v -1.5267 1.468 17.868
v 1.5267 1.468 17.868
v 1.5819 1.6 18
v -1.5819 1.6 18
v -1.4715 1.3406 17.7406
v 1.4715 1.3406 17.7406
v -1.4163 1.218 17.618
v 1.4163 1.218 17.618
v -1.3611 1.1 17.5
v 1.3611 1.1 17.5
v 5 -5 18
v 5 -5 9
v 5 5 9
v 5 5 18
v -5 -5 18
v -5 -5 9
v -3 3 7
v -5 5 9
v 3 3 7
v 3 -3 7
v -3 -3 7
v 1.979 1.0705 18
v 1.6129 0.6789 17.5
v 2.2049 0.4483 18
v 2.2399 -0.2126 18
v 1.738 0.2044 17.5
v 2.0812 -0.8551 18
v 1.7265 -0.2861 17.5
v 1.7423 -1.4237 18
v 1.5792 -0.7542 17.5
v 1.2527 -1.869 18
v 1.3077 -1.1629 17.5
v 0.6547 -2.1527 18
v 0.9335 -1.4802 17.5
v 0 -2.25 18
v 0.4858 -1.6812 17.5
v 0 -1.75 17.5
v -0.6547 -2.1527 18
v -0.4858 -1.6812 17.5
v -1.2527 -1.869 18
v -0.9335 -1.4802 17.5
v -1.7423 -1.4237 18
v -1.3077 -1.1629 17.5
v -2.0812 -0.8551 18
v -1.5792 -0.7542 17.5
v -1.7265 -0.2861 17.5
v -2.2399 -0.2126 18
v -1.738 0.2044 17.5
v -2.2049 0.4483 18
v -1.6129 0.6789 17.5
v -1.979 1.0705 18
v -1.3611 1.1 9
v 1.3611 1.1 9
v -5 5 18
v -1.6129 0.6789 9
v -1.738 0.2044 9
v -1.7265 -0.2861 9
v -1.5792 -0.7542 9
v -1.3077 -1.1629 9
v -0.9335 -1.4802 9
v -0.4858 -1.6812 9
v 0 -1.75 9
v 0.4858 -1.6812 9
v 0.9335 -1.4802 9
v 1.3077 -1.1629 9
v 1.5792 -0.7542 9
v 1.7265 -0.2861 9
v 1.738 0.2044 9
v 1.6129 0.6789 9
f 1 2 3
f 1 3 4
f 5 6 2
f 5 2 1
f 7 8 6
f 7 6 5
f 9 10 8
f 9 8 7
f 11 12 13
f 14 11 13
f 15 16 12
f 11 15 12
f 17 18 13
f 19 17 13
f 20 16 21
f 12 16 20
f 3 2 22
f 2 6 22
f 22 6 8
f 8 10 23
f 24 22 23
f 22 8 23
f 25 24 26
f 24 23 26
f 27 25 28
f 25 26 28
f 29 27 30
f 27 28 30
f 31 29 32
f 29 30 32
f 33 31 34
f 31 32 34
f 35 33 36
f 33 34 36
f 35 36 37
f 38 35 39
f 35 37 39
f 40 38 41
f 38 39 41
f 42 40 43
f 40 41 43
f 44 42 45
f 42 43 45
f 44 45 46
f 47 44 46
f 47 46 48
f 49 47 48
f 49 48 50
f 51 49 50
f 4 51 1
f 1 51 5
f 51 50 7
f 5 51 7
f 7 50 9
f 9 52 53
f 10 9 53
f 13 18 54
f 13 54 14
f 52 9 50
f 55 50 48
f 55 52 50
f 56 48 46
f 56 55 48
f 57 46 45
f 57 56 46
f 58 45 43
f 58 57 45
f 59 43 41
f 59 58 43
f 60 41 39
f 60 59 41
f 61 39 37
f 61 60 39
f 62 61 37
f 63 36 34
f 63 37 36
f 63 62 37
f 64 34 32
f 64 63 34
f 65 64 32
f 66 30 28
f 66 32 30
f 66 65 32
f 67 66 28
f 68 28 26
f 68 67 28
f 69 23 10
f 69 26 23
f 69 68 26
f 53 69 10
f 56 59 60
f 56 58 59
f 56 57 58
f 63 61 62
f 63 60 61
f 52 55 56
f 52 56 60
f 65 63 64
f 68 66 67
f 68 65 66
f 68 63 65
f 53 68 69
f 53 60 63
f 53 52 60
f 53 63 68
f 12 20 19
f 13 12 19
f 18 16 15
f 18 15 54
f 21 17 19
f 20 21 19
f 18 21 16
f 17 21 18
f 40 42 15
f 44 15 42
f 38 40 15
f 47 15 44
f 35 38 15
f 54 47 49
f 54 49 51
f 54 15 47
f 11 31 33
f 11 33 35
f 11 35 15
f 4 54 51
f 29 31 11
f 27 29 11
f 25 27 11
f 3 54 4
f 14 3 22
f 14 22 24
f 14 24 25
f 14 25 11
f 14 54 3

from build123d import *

# Parameters (mm, degrees)
BOX406008008_W     = 10
BOX406008008_H     = 10
BOX406008008_DEPTH = 19
CYLINDER079_R      = 1.75
CYLINDER079_DEPTH  = 17
BOX406008009_W     = 10
BOX406008009_H     = 10
BOX406008009_DEPTH = 11
CHAMFER004_SIZE    = 2
CHAMFER008_SIZE    = 0.5


with BuildPart() as cube343:
    # Box406008008 → Box406008008 (new body)
    with BuildSketch(Plane(origin=(-5, 1.1, 1.5), x_dir=(1, 0, 0), z_dir=(0, 0, 1))):
        with Locations((5, 5)):
            Rectangle(BOX406008008_W, BOX406008008_H)
    extrude(amount=BOX406008008_DEPTH)


with BuildPart() as motor_shaft_hole:
    # Cylinder079 → Cylinder079 (new body)
    with BuildSketch(Plane.XY.offset(9)):
        Circle(CYLINDER079_R)
    extrude(amount=CYLINDER079_DEPTH)

    # Cut064: cut Cube343
    add(cube343.part, mode=Mode.SUBTRACT)


with BuildPart() as chamfer008:
    # Box406008009 → Box406008009 (new body)
    with BuildSketch(Plane(origin=(-5, -5, 7), x_dir=(1, 0, 0), z_dir=(0, 0, 1))):
        with Locations((5, 5)):
            Rectangle(BOX406008009_W, BOX406008009_H)
    extrude(amount=BOX406008009_DEPTH)

    # Cut065: cut Motor Shaft Hole
    add(motor_shaft_hole.part, mode=Mode.SUBTRACT)

    # Chamfer004
    chamfer004_edges = [chamfer008.edges().sort_by_distance(p)[0] for p in [
        (-5, 0, 7),
        (0, -5, 7),
        (0, 5, 7),
        (5, 0, 7),
    ]]
    chamfer(chamfer004_edges, length=CHAMFER004_SIZE)

    # Chamfer008
    chamfer008_edges = [chamfer008.edges().sort_by_distance(p)[0] for p in [
        (1.649904, 0.583367, 18),
        (0, 1.1, 18),
        (-0.583367, -1.649904, 18),
    ]]
    chamfer(chamfer008_edges, length=CHAMFER008_SIZE)


solid = chamfer008.part
